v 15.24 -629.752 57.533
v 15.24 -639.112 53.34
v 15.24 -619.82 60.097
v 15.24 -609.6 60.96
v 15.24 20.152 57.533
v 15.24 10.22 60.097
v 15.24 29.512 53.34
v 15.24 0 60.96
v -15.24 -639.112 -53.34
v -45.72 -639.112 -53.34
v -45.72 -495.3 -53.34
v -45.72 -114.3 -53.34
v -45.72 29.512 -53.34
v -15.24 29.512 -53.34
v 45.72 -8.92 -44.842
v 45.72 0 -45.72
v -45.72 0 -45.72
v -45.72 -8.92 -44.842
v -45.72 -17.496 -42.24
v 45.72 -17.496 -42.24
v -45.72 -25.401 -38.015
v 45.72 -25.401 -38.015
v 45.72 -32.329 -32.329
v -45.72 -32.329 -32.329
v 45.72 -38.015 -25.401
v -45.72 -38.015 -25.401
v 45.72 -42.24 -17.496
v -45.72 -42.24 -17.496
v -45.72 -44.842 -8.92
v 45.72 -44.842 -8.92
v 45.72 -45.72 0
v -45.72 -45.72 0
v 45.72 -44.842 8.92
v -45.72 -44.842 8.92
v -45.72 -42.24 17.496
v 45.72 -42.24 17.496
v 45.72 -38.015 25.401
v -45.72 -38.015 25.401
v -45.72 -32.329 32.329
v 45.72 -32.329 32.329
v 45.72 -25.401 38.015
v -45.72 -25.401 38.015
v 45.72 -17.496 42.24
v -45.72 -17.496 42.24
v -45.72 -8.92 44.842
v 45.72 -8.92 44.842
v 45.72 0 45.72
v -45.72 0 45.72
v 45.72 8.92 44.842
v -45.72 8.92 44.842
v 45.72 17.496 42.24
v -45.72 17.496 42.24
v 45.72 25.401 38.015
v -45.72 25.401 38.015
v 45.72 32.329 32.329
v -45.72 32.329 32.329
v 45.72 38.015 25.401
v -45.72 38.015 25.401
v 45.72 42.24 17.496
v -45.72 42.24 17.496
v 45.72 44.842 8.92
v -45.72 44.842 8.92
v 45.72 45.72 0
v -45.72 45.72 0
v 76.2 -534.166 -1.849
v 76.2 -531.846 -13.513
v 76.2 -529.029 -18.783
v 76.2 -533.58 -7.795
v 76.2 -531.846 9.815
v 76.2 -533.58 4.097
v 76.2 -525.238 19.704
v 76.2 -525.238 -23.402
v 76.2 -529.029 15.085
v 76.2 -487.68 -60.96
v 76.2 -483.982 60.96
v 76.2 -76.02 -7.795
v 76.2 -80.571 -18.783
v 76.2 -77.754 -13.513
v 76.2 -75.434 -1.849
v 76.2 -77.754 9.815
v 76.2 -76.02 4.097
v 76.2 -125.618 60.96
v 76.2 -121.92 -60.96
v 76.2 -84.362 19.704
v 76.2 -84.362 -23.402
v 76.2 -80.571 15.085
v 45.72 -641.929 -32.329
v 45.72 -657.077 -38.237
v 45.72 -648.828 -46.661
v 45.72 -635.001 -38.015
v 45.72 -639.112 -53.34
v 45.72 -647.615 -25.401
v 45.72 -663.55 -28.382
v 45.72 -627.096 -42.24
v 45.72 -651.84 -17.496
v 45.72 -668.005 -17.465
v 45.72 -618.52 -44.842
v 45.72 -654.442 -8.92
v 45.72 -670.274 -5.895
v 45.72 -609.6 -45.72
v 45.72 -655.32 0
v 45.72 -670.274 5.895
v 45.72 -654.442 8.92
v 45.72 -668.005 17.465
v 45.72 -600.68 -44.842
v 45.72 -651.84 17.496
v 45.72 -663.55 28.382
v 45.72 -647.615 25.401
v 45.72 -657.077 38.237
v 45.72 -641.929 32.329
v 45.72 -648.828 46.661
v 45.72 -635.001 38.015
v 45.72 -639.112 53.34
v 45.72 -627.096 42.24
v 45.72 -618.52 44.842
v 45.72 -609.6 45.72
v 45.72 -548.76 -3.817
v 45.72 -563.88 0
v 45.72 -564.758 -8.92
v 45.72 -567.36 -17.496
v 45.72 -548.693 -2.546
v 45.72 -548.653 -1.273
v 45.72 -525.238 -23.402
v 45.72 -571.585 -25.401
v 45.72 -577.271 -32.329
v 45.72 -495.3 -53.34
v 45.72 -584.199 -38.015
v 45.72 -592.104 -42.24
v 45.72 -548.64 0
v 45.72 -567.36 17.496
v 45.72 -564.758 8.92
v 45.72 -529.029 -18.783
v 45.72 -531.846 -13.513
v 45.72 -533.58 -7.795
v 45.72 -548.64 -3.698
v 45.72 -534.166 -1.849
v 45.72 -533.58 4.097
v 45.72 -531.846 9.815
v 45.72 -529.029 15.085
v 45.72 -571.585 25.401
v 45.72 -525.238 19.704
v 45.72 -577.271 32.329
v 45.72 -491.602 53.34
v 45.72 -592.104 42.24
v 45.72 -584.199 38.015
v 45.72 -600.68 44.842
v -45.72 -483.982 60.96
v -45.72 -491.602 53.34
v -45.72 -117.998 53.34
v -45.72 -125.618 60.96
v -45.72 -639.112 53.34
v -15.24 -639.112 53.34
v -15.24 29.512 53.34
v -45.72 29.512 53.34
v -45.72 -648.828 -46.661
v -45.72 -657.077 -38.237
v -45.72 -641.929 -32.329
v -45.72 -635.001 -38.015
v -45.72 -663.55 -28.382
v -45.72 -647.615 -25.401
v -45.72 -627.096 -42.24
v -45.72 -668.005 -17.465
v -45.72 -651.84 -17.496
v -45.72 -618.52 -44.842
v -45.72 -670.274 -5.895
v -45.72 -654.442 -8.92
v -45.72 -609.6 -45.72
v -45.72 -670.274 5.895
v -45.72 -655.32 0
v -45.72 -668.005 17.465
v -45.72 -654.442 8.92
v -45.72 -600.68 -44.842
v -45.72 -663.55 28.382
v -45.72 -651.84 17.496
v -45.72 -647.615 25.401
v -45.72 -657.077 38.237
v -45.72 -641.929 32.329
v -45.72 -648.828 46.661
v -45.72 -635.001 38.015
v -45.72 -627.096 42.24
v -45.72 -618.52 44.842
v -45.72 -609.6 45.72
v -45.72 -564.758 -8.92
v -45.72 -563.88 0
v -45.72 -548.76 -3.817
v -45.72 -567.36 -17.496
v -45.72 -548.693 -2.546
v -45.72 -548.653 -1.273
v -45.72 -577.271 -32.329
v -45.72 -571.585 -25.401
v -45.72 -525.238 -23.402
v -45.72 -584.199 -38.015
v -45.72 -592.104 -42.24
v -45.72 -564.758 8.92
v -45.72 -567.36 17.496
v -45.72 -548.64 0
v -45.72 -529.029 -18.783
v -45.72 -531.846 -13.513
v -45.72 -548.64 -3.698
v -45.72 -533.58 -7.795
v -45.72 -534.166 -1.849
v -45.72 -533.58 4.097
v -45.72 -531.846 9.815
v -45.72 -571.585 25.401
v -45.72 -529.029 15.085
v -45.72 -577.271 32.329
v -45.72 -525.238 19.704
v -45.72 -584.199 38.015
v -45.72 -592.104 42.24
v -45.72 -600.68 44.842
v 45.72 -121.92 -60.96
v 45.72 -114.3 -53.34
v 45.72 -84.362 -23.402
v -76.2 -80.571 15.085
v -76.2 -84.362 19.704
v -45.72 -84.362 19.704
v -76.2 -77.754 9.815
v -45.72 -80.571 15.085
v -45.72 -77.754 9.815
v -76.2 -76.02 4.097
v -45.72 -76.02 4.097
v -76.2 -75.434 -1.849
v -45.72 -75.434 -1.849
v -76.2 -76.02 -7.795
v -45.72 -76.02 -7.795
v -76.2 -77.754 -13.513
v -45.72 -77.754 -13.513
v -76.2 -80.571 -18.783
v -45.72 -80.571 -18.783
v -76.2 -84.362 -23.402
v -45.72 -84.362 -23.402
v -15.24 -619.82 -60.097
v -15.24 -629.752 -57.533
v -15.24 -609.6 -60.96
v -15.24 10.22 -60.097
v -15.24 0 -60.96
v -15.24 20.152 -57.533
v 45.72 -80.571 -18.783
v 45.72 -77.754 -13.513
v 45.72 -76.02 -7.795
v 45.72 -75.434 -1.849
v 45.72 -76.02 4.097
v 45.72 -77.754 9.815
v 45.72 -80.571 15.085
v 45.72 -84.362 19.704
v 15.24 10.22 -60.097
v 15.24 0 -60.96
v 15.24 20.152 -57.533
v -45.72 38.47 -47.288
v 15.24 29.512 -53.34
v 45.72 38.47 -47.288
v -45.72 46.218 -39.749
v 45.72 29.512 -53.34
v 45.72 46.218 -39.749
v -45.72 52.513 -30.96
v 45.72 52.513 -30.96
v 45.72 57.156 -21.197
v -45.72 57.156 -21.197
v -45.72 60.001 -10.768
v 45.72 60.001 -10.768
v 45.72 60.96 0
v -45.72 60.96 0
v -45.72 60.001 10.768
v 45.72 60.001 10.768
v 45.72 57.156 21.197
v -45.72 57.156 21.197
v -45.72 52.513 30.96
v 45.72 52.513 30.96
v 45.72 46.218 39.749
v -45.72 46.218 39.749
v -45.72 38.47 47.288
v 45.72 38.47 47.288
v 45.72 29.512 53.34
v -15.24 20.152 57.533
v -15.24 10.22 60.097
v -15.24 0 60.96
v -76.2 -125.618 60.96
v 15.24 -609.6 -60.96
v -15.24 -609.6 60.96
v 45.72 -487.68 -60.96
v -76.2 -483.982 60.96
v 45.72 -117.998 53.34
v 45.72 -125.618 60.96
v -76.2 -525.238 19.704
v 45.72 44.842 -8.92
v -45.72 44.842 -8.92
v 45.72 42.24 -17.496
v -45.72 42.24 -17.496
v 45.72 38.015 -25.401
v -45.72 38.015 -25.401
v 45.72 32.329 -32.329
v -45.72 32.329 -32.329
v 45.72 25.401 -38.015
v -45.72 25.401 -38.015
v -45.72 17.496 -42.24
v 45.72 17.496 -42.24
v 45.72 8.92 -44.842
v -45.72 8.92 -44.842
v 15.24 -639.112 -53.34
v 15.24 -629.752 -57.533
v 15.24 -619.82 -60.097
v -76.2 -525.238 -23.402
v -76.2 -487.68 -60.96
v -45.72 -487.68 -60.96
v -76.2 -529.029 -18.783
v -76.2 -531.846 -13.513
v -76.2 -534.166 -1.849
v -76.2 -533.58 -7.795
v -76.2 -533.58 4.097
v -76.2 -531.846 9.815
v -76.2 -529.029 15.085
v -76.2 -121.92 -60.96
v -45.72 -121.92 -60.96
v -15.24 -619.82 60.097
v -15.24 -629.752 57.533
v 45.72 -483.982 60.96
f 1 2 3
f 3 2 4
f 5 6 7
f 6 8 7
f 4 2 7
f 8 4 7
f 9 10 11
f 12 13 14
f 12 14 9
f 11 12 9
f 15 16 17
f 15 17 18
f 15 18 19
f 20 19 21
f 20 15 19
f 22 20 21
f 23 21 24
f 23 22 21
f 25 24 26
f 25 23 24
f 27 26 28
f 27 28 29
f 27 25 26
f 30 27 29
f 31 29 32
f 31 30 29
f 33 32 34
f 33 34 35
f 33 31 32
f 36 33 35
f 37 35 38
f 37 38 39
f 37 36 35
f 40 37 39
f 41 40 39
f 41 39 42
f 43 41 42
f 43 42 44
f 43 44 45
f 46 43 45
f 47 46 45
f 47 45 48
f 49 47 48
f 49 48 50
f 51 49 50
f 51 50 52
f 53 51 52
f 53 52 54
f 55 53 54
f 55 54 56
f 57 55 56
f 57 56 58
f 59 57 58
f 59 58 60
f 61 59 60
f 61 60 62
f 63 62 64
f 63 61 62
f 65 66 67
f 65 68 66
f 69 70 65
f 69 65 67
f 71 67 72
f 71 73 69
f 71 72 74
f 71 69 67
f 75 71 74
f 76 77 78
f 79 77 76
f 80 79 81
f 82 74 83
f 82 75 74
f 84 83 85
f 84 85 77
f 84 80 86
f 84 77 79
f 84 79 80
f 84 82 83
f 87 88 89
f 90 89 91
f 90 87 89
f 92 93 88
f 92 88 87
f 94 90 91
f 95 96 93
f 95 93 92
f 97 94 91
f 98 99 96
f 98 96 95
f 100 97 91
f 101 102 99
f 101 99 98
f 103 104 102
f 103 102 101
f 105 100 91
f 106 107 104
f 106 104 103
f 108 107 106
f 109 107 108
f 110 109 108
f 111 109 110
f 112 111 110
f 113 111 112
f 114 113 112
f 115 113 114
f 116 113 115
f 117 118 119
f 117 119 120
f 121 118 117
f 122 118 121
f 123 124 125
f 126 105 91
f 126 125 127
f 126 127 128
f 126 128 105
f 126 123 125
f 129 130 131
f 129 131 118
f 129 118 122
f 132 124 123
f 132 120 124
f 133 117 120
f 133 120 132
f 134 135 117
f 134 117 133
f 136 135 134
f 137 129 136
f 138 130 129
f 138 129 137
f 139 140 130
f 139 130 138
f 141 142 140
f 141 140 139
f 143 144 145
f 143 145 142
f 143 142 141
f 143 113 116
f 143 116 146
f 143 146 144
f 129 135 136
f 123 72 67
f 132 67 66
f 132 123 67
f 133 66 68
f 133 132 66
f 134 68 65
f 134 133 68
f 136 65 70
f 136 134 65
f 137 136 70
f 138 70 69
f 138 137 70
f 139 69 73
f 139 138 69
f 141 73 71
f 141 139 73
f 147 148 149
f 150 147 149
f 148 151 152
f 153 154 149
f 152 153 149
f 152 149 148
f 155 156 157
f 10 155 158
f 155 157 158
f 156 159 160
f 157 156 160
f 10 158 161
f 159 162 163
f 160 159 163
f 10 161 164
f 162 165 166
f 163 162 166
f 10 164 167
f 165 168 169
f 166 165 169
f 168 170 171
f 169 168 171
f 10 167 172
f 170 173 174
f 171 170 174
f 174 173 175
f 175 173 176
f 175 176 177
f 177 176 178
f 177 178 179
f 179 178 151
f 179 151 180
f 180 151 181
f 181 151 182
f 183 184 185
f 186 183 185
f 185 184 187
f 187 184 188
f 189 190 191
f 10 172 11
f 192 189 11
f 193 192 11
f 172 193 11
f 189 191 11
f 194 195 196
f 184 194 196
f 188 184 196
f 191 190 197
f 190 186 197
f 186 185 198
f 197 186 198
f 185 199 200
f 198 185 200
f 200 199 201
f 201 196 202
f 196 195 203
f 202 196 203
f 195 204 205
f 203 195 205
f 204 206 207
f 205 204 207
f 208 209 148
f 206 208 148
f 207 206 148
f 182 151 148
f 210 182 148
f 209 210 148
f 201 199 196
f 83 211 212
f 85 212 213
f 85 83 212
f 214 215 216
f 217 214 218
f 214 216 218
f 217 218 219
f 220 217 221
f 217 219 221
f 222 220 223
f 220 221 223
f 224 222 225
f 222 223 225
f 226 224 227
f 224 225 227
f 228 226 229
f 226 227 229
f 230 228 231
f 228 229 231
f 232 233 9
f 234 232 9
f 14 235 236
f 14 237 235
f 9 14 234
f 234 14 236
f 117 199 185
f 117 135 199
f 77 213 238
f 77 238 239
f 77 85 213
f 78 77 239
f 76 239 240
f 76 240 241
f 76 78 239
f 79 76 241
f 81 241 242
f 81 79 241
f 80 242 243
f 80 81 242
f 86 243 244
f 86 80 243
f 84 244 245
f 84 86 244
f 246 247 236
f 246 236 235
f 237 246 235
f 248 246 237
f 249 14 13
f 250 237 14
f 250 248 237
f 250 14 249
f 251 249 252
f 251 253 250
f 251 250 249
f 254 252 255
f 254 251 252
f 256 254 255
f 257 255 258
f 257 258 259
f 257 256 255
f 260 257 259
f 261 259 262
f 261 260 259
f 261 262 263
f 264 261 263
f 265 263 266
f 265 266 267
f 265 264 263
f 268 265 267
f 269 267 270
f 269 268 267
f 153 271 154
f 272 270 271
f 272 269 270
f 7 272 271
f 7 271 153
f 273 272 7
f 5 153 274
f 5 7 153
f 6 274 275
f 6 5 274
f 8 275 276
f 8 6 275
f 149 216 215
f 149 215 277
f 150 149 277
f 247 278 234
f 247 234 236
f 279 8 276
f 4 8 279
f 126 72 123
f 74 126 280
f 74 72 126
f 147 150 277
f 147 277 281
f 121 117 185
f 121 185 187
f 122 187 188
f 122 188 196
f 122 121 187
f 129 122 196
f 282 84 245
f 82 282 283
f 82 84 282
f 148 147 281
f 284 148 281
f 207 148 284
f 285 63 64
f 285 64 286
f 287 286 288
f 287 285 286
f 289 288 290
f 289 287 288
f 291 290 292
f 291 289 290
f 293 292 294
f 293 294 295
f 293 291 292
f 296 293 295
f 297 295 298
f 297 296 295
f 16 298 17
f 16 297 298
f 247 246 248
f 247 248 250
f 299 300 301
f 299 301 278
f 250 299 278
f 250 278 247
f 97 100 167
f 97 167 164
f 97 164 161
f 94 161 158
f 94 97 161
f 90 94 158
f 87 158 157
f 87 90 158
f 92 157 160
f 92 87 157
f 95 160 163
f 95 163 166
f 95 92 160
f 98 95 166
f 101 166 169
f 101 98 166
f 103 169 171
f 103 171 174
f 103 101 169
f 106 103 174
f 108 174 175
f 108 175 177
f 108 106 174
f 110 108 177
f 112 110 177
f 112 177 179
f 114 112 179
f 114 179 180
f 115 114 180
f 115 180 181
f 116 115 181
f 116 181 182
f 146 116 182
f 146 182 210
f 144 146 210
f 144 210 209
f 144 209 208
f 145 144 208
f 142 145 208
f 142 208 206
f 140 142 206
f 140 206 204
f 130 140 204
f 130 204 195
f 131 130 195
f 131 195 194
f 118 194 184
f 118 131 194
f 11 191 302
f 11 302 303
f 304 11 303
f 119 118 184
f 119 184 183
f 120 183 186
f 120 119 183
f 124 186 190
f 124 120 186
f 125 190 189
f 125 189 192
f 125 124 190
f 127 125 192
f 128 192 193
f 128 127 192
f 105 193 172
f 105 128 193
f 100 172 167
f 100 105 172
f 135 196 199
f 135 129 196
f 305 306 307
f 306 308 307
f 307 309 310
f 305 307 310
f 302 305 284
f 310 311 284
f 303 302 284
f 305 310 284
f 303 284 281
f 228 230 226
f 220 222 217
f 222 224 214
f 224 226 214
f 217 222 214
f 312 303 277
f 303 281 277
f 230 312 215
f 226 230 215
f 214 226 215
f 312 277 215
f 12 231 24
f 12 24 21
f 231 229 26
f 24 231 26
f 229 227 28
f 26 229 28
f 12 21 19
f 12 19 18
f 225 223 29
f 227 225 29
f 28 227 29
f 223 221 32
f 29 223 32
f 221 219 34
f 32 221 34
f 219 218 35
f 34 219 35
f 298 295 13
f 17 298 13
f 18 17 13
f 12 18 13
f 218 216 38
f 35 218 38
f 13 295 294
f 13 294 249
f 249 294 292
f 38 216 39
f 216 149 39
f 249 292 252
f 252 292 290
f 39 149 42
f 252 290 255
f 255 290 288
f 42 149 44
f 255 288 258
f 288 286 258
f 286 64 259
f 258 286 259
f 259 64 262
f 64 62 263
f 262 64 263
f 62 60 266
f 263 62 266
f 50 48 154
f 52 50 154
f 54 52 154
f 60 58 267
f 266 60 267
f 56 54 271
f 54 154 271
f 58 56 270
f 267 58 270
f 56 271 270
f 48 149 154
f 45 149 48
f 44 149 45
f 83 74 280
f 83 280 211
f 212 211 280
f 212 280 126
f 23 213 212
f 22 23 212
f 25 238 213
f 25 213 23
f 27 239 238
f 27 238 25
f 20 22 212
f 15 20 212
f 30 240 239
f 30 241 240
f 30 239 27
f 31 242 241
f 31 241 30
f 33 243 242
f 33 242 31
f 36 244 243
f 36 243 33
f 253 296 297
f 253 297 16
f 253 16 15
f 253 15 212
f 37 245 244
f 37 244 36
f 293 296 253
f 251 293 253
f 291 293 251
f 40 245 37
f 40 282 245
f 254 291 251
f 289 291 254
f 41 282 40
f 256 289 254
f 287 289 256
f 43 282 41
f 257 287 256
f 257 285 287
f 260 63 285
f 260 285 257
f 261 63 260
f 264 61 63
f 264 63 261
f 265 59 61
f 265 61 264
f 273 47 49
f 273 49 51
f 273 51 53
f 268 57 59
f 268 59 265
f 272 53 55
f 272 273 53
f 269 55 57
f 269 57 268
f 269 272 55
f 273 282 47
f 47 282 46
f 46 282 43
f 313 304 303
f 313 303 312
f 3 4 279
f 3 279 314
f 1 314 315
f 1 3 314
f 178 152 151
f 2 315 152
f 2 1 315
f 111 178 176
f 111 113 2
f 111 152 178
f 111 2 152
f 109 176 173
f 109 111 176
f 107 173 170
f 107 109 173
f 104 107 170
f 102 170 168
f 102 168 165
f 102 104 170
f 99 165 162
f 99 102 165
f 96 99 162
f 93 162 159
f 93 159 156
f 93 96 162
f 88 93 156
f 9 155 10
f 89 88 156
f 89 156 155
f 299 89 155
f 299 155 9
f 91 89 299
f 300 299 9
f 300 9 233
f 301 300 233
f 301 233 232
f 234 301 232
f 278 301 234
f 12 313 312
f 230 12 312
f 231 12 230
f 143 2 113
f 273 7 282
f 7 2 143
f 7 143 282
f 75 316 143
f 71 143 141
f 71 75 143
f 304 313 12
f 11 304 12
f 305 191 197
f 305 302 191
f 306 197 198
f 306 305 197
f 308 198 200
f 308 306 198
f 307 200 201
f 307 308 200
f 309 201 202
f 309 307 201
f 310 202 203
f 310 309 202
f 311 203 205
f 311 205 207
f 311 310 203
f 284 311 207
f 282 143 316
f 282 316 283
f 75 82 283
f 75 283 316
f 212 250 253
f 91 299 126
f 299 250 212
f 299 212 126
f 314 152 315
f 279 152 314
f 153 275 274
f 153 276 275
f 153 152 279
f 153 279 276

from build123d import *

# Parameters (mm, degrees)
F1_DEPTH = 45.72
F3_DEPTH = 76.2
F2_W     = 30.48
F2_H     = 7.62
F4_DEPTH = 762
F5_R     = 30.48


with BuildPart() as f1:
    # F0 (on Right) → F1 (new body, symmetric)
    with BuildSketch(Plane.YZ):
        with BuildLine():
            ThreePointArc((0, 45.72), (32.3289220358, 32.3289220358), (45.72, 0))
            ThreePointArc((45.72, 0), (32.3289220358, -32.3289220358), (0, -45.72))
            Line((0, -45.72), (0, -60.96))
            ThreePointArc((0, -60.96), (43.1052293811, -43.1052293811), (60.96, 0))
            ThreePointArc((60.96, 0), (43.1052293811, 43.1052293811), (0, 60.96))
            Line((0, 60.96), (0, 45.72))
        make_face()
        with BuildLine():
            ThreePointArc((0, -45.72), (-45.72, 0), (0, 45.72))
            Line((0, 45.72), (0, 60.96))
            ThreePointArc((0, 60.96), (-43.1052293811, 43.1052293811), (-60.96, 0))
            ThreePointArc((-60.96, 0), (-60.9300804884, -1.9096836578), (-60.8403513231, -3.8174927486))
            ThreePointArc((-60.8403513231, -3.8174927486), (-41.7337228272, -44.434423356), (0, -60.96))
            Line((0, -60.96), (0, -45.72))
        make_face()
        with BuildLine():
            ThreePointArc((-60.96, 0), (-43.1052293811, 43.1052293811), (0, 60.96))
            Line((0, 60.96), (-60.96, 60.96))
            Line((-60.96, 60.96), (-60.96, 0))
        make_face()
        with BuildLine():
            Line((-121.92, -60.96), (0, -60.96))
            ThreePointArc((0, -60.96), (-41.7337228272, -44.434423356), (-60.8403513231, -3.8174927486))
            Line((-60.8403513231, -3.8174927486), (-62.8089220358, -1.8489220358))
            Line((-62.8089220358, -1.8489220358), (-121.92, -60.96))
        make_face()
        Polygon((-62.8089220358, -1.8489220358), (-60.96, 0), (-60.96, 60.96), (-125.6178440717, 60.96), align=None)
        Polygon((-304.8, -60.96), (-121.92, -60.96), (-62.8089220358, -1.8489220358), (-125.6178440717, 60.96), (-304.8, 60.96), align=None)
        Polygon((-487.68, -60.96), (-304.8, -60.96), (-304.8, 60.96), (-483.9821559283, 60.96), (-546.7910779642, -1.8489220358), align=None)
        Polygon((-548.64, -60.96), (-487.68, -60.96), (-546.7910779642, -1.8489220358), (-548.64, -3.6978440717), align=None)
        with BuildLine():
            Line((-546.7910779642, -1.8489220358), (-483.9821559283, 60.96))
            Line((-483.9821559283, 60.96), (-609.6, 60.96))
            ThreePointArc((-609.6, 60.96), (-566.4947706189, 43.1052293811), (-548.64, 0))
            Line((-548.64, 0), (-546.7910779642, -1.8489220358))
        make_face()
        with BuildLine():
            Line((-609.6, -60.96), (-548.64, -60.96))
            Line((-548.64, -60.96), (-548.64, -3.6978440717))
            Line((-548.64, -3.6978440717), (-548.7596486769, -3.8174927486))
            ThreePointArc((-548.7596486769, -3.8174927486), (-567.8662771728, -44.434423356), (-609.6, -60.96))
        make_face()
        with BuildLine():
            ThreePointArc((-548.64, 0), (-566.4947706189, 43.1052293811), (-609.6, 60.96))
            Line((-609.6, 60.96), (-609.6, 45.72))
            ThreePointArc((-609.6, 45.72), (-577.2710779642, 32.3289220358), (-563.88, 0))
            ThreePointArc((-563.88, 0), (-577.2710779642, -32.3289220358), (-609.6, -45.72))
            Line((-609.6, -45.72), (-609.6, -60.96))
            ThreePointArc((-609.6, -60.96), (-567.8662771728, -44.434423356), (-548.7596486769, -3.8174927486))
            ThreePointArc((-548.7596486769, -3.8174927486), (-548.6699195116, -1.9096836578), (-548.64, 0))
        make_face()
        with BuildLine():
            Line((-609.6, 45.72), (-609.6, 60.96))
            ThreePointArc((-609.6, 60.96), (-670.56, 0), (-609.6, -60.96))
            Line((-609.6, -60.96), (-609.6, -45.72))
            ThreePointArc((-609.6, -45.72), (-655.32, 0), (-609.6, 45.72))
        make_face()
        Polygon((-548.64, -3.6978440717), (-546.7910779642, -1.8489220358), (-548.64, 0), align=None)
        with BuildLine():
            ThreePointArc((-60.8403513231, -3.8174927486), (-60.9300804884, -1.9096836578), (-60.96, 0))
            Line((-60.96, 0), (-62.8089220358, -1.8489220358))
            Line((-62.8089220358, -1.8489220358), (-60.8403513231, -3.8174927486))
        make_face()
    extrude(amount=F1_DEPTH, both=True)

    # F0 (on Right) → F3 (join, symmetric)
    with BuildSketch(Plane.YZ):
        Polygon((-487.68, -60.96), (-304.8, -60.96), (-304.8, 60.96), (-483.9821559283, 60.96), (-546.7910779642, -1.8489220358), align=None)
        Polygon((-304.8, -60.96), (-121.92, -60.96), (-62.8089220358, -1.8489220358), (-125.6178440717, 60.96), (-304.8, 60.96), align=None)
    extrude(amount=F3_DEPTH, both=True)

    # F2 (on Front) → F4 (cut, symmetric)
    with BuildSketch(Plane.XZ):
        with Locations((-30.48, 57.15)):
            Rectangle(F2_W, F2_H)
        with Locations((30.48, 57.15)):
            Rectangle(F2_W, F2_H)
        with Locations((-30.48, -57.15)):
            Rectangle(F2_W, F2_H)
        with Locations((30.48, -57.15)):
            Rectangle(F2_W, F2_H)
    extrude(amount=F4_DEPTH, both=True, mode=Mode.SUBTRACT)

    # F5
    f5_edges = [f1.edges().sort_by_distance(p)[0] for p in [
        (60.96, -546.791078, -1.848922),
        (-60.96, -546.791078, -1.848922),
        (-60.96, -62.808922, -1.848922),
        (60.96, -62.808922, -1.848922),
    ]]
    fillet(f5_edges, radius=F5_R)


solid = f1.part
